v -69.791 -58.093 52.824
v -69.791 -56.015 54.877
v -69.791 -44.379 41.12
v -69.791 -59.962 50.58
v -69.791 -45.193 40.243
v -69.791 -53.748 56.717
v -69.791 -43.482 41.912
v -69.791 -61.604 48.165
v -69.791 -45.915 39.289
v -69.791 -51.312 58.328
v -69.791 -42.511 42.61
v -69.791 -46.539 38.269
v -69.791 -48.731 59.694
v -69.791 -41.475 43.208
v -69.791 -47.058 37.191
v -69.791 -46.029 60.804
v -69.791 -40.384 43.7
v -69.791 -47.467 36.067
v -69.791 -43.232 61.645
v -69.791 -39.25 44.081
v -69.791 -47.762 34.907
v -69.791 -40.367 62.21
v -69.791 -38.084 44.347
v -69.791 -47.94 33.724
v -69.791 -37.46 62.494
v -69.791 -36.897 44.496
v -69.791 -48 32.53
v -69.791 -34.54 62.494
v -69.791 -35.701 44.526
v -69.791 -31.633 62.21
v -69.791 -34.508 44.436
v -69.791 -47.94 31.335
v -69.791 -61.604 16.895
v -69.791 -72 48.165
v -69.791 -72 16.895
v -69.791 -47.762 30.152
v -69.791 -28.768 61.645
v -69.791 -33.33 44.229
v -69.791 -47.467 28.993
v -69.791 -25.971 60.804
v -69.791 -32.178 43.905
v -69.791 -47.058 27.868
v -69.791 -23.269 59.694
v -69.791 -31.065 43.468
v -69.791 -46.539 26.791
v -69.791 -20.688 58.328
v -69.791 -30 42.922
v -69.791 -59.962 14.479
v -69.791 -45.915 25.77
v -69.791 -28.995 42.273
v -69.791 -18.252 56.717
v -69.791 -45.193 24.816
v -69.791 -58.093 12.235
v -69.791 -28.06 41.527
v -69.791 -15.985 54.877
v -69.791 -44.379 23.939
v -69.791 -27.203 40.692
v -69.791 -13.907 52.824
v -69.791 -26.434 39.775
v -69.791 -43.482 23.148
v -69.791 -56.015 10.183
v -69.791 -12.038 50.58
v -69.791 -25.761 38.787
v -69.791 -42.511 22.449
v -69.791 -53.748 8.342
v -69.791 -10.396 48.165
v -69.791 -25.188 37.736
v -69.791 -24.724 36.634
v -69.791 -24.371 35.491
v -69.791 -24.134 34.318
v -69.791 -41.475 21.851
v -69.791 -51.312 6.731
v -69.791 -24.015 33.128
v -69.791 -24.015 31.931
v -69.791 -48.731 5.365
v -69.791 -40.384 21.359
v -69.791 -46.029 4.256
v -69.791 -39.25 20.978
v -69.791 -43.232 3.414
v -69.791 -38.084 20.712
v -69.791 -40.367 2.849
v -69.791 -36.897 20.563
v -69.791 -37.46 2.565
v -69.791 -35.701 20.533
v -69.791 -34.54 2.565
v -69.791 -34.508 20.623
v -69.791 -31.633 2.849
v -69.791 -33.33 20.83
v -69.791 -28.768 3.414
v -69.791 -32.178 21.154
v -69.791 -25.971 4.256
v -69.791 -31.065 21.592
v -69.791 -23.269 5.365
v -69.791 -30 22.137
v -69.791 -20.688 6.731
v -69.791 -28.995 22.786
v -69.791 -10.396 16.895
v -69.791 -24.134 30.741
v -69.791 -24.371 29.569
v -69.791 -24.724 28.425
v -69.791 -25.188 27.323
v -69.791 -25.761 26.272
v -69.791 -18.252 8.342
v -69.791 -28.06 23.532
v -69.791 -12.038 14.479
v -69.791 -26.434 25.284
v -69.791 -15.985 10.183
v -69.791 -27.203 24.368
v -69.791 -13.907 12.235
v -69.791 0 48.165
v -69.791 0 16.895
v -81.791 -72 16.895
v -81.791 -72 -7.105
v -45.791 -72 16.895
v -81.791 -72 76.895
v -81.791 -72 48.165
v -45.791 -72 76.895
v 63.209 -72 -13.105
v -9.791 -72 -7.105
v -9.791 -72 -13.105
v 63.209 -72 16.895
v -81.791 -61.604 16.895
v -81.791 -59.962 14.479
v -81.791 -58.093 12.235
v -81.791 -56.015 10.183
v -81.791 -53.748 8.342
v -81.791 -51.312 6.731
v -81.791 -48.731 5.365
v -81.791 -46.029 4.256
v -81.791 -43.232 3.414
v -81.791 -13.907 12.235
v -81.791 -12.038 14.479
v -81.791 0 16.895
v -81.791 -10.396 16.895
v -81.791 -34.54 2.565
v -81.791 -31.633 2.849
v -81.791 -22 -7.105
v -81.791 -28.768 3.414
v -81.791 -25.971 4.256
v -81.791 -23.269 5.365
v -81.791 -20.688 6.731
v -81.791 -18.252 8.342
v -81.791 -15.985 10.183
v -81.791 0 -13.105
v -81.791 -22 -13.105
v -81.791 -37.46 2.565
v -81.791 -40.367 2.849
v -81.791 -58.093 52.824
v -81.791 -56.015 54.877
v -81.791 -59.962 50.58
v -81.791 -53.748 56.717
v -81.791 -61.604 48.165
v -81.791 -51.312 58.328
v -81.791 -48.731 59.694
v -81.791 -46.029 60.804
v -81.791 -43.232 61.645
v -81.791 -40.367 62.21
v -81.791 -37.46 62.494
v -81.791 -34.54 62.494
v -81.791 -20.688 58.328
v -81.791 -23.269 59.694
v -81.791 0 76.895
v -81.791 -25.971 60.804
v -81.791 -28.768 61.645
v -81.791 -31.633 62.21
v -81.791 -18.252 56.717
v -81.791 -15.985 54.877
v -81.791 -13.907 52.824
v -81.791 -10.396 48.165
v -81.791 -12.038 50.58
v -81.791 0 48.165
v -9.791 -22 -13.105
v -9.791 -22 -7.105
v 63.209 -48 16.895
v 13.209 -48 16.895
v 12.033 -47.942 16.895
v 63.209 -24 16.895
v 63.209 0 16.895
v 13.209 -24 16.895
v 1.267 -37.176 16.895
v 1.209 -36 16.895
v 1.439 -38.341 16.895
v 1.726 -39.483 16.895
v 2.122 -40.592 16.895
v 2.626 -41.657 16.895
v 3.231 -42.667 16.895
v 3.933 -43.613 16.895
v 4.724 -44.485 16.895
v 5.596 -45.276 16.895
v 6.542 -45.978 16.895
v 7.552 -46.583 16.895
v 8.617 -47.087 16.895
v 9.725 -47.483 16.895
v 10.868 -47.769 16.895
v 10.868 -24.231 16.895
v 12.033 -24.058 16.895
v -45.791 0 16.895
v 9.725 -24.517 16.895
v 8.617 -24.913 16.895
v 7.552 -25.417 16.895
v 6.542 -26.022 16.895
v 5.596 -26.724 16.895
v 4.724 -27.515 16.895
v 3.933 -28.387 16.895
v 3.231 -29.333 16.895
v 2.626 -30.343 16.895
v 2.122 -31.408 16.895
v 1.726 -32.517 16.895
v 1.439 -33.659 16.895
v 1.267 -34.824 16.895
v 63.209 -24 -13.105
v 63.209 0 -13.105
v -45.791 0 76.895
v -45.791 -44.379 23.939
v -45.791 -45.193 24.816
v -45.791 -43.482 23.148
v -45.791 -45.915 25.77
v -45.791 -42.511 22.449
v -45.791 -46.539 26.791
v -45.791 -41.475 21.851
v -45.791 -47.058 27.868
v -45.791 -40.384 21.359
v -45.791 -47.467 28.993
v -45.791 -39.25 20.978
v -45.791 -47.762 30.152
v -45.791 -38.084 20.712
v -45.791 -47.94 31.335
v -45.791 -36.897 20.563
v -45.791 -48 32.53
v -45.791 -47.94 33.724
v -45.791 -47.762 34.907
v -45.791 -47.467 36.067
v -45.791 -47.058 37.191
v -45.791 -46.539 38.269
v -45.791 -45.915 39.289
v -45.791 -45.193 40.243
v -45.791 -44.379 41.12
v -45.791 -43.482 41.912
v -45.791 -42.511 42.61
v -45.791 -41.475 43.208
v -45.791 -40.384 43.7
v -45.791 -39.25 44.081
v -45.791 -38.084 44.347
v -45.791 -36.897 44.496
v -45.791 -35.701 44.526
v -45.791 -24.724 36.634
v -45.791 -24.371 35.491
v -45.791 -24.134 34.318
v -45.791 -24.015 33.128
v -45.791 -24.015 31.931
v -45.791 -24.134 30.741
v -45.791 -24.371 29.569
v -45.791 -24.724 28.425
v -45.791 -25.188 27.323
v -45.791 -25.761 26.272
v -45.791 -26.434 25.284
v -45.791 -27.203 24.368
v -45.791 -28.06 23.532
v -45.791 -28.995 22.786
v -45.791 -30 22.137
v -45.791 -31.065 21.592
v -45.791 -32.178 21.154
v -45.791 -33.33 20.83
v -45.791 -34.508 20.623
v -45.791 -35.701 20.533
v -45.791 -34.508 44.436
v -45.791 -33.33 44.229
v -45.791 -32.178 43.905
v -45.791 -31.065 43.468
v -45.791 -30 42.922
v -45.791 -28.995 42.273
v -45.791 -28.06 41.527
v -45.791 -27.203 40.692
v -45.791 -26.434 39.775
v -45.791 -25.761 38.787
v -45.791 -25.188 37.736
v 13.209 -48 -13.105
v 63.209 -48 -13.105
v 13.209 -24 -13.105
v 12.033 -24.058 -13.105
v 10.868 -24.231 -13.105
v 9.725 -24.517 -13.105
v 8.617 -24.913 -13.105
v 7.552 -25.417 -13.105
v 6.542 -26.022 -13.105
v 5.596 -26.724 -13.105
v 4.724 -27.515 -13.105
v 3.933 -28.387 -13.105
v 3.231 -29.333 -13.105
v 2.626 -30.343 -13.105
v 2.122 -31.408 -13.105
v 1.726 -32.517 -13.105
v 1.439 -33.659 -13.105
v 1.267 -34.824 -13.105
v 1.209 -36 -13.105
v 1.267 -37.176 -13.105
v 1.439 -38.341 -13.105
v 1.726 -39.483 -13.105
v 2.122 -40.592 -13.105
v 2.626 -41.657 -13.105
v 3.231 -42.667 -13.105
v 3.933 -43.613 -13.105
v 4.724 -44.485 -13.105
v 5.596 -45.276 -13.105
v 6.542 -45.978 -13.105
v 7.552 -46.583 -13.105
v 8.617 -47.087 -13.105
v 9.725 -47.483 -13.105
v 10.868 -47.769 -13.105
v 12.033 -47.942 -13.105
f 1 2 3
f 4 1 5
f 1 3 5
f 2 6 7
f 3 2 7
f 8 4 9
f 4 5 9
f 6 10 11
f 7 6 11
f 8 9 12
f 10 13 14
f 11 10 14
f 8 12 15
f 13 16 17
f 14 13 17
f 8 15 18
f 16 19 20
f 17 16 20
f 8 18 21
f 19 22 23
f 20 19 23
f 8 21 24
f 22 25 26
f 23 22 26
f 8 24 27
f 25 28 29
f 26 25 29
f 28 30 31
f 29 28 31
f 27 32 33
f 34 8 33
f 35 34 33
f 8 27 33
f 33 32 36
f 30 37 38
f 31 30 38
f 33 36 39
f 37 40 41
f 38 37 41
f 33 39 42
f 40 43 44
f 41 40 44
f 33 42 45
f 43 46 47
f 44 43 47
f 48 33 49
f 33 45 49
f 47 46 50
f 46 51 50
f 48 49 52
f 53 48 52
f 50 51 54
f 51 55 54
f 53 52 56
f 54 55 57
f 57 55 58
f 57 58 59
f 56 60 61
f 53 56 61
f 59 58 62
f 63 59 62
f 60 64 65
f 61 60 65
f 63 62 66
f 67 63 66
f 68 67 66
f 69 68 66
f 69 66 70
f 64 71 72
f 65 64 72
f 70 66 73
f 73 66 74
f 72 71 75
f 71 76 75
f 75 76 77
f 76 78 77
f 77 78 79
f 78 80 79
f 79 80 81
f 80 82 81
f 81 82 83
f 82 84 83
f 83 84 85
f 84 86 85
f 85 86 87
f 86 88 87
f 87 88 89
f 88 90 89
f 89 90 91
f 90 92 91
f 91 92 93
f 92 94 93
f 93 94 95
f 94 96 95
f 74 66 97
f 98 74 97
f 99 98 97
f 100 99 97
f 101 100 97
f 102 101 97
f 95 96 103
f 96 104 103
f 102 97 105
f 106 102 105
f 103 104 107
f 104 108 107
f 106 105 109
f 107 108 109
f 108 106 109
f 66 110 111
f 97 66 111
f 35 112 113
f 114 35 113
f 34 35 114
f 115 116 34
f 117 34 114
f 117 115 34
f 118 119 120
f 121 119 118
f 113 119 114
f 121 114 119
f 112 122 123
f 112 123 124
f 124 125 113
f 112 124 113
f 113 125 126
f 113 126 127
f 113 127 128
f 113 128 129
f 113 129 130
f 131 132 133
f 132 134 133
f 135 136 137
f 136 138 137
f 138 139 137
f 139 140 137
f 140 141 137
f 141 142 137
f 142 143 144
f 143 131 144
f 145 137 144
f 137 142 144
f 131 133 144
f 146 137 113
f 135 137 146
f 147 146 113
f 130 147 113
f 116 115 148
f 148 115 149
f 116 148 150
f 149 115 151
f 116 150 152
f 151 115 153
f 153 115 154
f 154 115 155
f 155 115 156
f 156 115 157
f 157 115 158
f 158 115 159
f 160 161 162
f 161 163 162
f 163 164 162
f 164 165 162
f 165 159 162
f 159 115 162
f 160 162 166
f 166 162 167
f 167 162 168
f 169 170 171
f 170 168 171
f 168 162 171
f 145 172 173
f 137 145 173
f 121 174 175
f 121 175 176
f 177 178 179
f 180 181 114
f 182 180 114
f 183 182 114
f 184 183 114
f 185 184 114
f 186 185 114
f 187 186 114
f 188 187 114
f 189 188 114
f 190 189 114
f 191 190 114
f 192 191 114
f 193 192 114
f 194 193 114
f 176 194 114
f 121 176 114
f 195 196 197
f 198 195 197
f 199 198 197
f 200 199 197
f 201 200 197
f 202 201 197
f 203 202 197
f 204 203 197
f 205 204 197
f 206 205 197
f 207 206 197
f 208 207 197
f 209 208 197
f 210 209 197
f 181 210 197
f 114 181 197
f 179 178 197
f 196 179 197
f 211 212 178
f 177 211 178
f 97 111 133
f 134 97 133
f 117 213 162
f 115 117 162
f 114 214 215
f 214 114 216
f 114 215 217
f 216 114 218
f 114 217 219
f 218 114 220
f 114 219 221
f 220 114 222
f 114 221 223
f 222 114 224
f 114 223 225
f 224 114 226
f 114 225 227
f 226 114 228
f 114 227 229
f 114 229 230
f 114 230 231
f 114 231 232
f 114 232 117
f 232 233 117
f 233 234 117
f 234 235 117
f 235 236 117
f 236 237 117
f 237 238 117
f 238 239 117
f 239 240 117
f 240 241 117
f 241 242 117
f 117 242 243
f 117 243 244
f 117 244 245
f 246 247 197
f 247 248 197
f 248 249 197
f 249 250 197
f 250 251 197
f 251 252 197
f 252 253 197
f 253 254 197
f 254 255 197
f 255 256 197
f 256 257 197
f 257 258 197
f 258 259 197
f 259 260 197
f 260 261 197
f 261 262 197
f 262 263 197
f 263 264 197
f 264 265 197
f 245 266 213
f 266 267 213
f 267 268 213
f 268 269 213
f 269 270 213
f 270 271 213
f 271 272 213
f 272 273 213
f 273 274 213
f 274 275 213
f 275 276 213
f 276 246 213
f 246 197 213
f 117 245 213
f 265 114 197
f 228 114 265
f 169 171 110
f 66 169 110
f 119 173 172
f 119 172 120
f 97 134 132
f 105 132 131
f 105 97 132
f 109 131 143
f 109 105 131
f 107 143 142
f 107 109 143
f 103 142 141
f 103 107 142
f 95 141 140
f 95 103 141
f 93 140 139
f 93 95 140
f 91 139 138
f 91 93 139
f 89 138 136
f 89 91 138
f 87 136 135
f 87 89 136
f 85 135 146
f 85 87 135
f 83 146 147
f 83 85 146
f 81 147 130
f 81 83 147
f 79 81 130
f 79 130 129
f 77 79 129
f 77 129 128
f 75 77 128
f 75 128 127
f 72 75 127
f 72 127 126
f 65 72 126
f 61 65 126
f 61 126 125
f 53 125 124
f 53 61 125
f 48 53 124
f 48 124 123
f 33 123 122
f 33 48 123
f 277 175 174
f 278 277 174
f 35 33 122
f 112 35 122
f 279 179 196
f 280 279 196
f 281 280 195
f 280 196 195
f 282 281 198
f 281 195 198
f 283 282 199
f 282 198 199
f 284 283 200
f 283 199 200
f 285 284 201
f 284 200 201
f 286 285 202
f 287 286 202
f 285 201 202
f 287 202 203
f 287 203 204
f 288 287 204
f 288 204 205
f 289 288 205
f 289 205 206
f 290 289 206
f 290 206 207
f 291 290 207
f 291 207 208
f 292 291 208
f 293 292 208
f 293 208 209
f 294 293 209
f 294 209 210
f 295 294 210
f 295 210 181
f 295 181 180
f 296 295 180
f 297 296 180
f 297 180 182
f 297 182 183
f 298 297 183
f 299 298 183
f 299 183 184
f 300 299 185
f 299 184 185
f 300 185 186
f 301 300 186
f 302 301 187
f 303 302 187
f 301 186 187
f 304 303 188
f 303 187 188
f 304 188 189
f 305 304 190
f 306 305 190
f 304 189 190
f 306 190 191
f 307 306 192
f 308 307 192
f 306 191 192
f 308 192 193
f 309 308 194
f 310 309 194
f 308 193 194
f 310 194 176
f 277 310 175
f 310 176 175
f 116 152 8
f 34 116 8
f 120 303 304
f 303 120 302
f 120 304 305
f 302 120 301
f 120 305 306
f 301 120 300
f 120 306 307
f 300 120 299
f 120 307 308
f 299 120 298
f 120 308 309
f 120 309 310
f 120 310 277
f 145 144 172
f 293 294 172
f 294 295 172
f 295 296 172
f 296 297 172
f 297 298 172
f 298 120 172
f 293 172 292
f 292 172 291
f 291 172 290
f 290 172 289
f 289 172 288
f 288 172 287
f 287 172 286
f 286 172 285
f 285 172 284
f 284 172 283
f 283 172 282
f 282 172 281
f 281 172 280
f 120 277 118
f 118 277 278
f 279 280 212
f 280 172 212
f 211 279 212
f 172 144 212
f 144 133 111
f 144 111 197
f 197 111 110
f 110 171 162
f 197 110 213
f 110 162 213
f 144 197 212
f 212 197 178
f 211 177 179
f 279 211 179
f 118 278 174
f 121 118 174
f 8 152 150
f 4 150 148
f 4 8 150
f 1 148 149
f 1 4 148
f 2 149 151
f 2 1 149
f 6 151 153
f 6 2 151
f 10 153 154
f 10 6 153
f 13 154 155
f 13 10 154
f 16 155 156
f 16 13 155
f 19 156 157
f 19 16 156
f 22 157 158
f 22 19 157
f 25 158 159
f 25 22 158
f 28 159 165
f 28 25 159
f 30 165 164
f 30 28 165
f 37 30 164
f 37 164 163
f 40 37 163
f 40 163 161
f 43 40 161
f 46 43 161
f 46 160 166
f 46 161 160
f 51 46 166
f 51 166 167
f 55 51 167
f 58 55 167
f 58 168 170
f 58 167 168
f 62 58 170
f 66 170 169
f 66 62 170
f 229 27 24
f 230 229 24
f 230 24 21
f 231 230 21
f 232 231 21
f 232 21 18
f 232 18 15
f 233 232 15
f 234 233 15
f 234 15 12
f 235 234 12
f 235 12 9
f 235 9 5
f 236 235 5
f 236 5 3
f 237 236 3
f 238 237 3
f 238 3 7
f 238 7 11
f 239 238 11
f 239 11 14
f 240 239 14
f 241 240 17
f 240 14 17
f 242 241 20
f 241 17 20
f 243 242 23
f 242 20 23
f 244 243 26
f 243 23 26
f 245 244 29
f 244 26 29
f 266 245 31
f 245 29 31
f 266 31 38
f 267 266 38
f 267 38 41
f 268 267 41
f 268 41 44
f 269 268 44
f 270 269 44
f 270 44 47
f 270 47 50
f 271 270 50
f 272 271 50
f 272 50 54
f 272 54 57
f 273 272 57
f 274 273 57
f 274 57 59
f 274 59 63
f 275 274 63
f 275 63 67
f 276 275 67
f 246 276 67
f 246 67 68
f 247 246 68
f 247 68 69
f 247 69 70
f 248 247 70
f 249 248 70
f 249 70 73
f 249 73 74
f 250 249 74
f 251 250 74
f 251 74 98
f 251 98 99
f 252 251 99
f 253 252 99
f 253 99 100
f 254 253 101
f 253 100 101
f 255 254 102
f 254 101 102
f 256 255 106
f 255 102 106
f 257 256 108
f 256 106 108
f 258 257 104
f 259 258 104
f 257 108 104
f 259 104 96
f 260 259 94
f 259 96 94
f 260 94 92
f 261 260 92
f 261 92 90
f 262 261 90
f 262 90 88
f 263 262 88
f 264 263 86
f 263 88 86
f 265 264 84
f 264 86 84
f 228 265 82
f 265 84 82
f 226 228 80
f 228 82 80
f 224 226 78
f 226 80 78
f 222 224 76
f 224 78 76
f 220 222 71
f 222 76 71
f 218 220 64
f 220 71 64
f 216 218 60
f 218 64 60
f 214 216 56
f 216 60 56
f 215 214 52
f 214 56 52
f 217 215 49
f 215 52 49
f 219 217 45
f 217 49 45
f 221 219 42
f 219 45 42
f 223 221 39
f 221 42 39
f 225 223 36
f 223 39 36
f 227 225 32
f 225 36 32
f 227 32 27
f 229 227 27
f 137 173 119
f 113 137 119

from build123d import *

# Parameters (mm, degrees)
F1_DEPTH = 72
F3_DEPTH = 30.001
F5_W     = 50
F5_H     = 6
F6_DEPTH = 72
F4_R     = 12
F7_DEPTH = 133.001
F8_DEPTH = 12.001


with BuildPart() as f1:
    # F0 (on Front) → F1 (new body)
    with BuildSketch(Plane.XZ):
        Polygon((-45.791163, 76.894684), (-81.791163, 76.894684), (-81.791163, 48.164527), (-69.791163, 48.164527), (-69.791163, 16.894684), (-81.791163, 16.894684), (-81.791163, -13.105316), (-9.791163, -13.105316), (63.208837, -13.105316), (63.208837, 16.894684), (-45.791163, 16.894684), align=None)
    extrude(amount=F1_DEPTH)

    # F2 (on face) → F3 (cut, through all)
    with BuildSketch(Plane.XY.offset(16.894684)):
        with BuildLine():
            Line((63.208837, -24), (13.208837, -24))
            ThreePointArc((13.208837, -24), (1.208837, -36), (13.208837, -48))
            Line((13.208837, -48), (63.208837, -48))
            Line((63.208837, -48), (63.208837, -24))
        make_face()
    extrude(amount=-F3_DEPTH, mode=Mode.SUBTRACT)

    # F5 (on face) → F6 (cut)
    with BuildSketch(Plane(origin=(-81.791163, 0, 0), x_dir=(0, -1, 0), z_dir=(-1, 0, 0))):
        with Locations((47, -10.105316)):
            Rectangle(F5_W, F5_H)
    extrude(amount=-F6_DEPTH, mode=Mode.SUBTRACT)

    # F4 (on face) → F7 (cut, through all)
    with BuildSketch(Plane(origin=(-69.791163, 0, 0), x_dir=(0, -1, 0), z_dir=(-1, 0, 0))):
        with Locations((36, 32.529606)):
            Circle(F4_R)
    extrude(amount=-F7_DEPTH, mode=Mode.SUBTRACT)

    # F4 (on face) → F8 (cut, through all)
    with BuildSketch(Plane(origin=(-69.791163, 0, 0), x_dir=(0, -1, 0), z_dir=(-1, 0, 0))):
        with Locations((36, 32.529606)):
            Circle(F4_R)
        with BuildLine():
            Line((61.603696, 16.894684), (10.396304, 16.894684))
            ThreePointArc((10.396304, 16.894684), (36, 2.529606), (61.603696, 16.894684))
        make_face()
        with BuildLine():
            Line((10.396304, 48.164527), (61.603696, 48.164527))
            ThreePointArc((61.603696, 48.164527), (36, 62.529606), (10.396304, 48.164527))
        make_face()
    extrude(amount=F8_DEPTH, mode=Mode.SUBTRACT)


solid = f1.part
